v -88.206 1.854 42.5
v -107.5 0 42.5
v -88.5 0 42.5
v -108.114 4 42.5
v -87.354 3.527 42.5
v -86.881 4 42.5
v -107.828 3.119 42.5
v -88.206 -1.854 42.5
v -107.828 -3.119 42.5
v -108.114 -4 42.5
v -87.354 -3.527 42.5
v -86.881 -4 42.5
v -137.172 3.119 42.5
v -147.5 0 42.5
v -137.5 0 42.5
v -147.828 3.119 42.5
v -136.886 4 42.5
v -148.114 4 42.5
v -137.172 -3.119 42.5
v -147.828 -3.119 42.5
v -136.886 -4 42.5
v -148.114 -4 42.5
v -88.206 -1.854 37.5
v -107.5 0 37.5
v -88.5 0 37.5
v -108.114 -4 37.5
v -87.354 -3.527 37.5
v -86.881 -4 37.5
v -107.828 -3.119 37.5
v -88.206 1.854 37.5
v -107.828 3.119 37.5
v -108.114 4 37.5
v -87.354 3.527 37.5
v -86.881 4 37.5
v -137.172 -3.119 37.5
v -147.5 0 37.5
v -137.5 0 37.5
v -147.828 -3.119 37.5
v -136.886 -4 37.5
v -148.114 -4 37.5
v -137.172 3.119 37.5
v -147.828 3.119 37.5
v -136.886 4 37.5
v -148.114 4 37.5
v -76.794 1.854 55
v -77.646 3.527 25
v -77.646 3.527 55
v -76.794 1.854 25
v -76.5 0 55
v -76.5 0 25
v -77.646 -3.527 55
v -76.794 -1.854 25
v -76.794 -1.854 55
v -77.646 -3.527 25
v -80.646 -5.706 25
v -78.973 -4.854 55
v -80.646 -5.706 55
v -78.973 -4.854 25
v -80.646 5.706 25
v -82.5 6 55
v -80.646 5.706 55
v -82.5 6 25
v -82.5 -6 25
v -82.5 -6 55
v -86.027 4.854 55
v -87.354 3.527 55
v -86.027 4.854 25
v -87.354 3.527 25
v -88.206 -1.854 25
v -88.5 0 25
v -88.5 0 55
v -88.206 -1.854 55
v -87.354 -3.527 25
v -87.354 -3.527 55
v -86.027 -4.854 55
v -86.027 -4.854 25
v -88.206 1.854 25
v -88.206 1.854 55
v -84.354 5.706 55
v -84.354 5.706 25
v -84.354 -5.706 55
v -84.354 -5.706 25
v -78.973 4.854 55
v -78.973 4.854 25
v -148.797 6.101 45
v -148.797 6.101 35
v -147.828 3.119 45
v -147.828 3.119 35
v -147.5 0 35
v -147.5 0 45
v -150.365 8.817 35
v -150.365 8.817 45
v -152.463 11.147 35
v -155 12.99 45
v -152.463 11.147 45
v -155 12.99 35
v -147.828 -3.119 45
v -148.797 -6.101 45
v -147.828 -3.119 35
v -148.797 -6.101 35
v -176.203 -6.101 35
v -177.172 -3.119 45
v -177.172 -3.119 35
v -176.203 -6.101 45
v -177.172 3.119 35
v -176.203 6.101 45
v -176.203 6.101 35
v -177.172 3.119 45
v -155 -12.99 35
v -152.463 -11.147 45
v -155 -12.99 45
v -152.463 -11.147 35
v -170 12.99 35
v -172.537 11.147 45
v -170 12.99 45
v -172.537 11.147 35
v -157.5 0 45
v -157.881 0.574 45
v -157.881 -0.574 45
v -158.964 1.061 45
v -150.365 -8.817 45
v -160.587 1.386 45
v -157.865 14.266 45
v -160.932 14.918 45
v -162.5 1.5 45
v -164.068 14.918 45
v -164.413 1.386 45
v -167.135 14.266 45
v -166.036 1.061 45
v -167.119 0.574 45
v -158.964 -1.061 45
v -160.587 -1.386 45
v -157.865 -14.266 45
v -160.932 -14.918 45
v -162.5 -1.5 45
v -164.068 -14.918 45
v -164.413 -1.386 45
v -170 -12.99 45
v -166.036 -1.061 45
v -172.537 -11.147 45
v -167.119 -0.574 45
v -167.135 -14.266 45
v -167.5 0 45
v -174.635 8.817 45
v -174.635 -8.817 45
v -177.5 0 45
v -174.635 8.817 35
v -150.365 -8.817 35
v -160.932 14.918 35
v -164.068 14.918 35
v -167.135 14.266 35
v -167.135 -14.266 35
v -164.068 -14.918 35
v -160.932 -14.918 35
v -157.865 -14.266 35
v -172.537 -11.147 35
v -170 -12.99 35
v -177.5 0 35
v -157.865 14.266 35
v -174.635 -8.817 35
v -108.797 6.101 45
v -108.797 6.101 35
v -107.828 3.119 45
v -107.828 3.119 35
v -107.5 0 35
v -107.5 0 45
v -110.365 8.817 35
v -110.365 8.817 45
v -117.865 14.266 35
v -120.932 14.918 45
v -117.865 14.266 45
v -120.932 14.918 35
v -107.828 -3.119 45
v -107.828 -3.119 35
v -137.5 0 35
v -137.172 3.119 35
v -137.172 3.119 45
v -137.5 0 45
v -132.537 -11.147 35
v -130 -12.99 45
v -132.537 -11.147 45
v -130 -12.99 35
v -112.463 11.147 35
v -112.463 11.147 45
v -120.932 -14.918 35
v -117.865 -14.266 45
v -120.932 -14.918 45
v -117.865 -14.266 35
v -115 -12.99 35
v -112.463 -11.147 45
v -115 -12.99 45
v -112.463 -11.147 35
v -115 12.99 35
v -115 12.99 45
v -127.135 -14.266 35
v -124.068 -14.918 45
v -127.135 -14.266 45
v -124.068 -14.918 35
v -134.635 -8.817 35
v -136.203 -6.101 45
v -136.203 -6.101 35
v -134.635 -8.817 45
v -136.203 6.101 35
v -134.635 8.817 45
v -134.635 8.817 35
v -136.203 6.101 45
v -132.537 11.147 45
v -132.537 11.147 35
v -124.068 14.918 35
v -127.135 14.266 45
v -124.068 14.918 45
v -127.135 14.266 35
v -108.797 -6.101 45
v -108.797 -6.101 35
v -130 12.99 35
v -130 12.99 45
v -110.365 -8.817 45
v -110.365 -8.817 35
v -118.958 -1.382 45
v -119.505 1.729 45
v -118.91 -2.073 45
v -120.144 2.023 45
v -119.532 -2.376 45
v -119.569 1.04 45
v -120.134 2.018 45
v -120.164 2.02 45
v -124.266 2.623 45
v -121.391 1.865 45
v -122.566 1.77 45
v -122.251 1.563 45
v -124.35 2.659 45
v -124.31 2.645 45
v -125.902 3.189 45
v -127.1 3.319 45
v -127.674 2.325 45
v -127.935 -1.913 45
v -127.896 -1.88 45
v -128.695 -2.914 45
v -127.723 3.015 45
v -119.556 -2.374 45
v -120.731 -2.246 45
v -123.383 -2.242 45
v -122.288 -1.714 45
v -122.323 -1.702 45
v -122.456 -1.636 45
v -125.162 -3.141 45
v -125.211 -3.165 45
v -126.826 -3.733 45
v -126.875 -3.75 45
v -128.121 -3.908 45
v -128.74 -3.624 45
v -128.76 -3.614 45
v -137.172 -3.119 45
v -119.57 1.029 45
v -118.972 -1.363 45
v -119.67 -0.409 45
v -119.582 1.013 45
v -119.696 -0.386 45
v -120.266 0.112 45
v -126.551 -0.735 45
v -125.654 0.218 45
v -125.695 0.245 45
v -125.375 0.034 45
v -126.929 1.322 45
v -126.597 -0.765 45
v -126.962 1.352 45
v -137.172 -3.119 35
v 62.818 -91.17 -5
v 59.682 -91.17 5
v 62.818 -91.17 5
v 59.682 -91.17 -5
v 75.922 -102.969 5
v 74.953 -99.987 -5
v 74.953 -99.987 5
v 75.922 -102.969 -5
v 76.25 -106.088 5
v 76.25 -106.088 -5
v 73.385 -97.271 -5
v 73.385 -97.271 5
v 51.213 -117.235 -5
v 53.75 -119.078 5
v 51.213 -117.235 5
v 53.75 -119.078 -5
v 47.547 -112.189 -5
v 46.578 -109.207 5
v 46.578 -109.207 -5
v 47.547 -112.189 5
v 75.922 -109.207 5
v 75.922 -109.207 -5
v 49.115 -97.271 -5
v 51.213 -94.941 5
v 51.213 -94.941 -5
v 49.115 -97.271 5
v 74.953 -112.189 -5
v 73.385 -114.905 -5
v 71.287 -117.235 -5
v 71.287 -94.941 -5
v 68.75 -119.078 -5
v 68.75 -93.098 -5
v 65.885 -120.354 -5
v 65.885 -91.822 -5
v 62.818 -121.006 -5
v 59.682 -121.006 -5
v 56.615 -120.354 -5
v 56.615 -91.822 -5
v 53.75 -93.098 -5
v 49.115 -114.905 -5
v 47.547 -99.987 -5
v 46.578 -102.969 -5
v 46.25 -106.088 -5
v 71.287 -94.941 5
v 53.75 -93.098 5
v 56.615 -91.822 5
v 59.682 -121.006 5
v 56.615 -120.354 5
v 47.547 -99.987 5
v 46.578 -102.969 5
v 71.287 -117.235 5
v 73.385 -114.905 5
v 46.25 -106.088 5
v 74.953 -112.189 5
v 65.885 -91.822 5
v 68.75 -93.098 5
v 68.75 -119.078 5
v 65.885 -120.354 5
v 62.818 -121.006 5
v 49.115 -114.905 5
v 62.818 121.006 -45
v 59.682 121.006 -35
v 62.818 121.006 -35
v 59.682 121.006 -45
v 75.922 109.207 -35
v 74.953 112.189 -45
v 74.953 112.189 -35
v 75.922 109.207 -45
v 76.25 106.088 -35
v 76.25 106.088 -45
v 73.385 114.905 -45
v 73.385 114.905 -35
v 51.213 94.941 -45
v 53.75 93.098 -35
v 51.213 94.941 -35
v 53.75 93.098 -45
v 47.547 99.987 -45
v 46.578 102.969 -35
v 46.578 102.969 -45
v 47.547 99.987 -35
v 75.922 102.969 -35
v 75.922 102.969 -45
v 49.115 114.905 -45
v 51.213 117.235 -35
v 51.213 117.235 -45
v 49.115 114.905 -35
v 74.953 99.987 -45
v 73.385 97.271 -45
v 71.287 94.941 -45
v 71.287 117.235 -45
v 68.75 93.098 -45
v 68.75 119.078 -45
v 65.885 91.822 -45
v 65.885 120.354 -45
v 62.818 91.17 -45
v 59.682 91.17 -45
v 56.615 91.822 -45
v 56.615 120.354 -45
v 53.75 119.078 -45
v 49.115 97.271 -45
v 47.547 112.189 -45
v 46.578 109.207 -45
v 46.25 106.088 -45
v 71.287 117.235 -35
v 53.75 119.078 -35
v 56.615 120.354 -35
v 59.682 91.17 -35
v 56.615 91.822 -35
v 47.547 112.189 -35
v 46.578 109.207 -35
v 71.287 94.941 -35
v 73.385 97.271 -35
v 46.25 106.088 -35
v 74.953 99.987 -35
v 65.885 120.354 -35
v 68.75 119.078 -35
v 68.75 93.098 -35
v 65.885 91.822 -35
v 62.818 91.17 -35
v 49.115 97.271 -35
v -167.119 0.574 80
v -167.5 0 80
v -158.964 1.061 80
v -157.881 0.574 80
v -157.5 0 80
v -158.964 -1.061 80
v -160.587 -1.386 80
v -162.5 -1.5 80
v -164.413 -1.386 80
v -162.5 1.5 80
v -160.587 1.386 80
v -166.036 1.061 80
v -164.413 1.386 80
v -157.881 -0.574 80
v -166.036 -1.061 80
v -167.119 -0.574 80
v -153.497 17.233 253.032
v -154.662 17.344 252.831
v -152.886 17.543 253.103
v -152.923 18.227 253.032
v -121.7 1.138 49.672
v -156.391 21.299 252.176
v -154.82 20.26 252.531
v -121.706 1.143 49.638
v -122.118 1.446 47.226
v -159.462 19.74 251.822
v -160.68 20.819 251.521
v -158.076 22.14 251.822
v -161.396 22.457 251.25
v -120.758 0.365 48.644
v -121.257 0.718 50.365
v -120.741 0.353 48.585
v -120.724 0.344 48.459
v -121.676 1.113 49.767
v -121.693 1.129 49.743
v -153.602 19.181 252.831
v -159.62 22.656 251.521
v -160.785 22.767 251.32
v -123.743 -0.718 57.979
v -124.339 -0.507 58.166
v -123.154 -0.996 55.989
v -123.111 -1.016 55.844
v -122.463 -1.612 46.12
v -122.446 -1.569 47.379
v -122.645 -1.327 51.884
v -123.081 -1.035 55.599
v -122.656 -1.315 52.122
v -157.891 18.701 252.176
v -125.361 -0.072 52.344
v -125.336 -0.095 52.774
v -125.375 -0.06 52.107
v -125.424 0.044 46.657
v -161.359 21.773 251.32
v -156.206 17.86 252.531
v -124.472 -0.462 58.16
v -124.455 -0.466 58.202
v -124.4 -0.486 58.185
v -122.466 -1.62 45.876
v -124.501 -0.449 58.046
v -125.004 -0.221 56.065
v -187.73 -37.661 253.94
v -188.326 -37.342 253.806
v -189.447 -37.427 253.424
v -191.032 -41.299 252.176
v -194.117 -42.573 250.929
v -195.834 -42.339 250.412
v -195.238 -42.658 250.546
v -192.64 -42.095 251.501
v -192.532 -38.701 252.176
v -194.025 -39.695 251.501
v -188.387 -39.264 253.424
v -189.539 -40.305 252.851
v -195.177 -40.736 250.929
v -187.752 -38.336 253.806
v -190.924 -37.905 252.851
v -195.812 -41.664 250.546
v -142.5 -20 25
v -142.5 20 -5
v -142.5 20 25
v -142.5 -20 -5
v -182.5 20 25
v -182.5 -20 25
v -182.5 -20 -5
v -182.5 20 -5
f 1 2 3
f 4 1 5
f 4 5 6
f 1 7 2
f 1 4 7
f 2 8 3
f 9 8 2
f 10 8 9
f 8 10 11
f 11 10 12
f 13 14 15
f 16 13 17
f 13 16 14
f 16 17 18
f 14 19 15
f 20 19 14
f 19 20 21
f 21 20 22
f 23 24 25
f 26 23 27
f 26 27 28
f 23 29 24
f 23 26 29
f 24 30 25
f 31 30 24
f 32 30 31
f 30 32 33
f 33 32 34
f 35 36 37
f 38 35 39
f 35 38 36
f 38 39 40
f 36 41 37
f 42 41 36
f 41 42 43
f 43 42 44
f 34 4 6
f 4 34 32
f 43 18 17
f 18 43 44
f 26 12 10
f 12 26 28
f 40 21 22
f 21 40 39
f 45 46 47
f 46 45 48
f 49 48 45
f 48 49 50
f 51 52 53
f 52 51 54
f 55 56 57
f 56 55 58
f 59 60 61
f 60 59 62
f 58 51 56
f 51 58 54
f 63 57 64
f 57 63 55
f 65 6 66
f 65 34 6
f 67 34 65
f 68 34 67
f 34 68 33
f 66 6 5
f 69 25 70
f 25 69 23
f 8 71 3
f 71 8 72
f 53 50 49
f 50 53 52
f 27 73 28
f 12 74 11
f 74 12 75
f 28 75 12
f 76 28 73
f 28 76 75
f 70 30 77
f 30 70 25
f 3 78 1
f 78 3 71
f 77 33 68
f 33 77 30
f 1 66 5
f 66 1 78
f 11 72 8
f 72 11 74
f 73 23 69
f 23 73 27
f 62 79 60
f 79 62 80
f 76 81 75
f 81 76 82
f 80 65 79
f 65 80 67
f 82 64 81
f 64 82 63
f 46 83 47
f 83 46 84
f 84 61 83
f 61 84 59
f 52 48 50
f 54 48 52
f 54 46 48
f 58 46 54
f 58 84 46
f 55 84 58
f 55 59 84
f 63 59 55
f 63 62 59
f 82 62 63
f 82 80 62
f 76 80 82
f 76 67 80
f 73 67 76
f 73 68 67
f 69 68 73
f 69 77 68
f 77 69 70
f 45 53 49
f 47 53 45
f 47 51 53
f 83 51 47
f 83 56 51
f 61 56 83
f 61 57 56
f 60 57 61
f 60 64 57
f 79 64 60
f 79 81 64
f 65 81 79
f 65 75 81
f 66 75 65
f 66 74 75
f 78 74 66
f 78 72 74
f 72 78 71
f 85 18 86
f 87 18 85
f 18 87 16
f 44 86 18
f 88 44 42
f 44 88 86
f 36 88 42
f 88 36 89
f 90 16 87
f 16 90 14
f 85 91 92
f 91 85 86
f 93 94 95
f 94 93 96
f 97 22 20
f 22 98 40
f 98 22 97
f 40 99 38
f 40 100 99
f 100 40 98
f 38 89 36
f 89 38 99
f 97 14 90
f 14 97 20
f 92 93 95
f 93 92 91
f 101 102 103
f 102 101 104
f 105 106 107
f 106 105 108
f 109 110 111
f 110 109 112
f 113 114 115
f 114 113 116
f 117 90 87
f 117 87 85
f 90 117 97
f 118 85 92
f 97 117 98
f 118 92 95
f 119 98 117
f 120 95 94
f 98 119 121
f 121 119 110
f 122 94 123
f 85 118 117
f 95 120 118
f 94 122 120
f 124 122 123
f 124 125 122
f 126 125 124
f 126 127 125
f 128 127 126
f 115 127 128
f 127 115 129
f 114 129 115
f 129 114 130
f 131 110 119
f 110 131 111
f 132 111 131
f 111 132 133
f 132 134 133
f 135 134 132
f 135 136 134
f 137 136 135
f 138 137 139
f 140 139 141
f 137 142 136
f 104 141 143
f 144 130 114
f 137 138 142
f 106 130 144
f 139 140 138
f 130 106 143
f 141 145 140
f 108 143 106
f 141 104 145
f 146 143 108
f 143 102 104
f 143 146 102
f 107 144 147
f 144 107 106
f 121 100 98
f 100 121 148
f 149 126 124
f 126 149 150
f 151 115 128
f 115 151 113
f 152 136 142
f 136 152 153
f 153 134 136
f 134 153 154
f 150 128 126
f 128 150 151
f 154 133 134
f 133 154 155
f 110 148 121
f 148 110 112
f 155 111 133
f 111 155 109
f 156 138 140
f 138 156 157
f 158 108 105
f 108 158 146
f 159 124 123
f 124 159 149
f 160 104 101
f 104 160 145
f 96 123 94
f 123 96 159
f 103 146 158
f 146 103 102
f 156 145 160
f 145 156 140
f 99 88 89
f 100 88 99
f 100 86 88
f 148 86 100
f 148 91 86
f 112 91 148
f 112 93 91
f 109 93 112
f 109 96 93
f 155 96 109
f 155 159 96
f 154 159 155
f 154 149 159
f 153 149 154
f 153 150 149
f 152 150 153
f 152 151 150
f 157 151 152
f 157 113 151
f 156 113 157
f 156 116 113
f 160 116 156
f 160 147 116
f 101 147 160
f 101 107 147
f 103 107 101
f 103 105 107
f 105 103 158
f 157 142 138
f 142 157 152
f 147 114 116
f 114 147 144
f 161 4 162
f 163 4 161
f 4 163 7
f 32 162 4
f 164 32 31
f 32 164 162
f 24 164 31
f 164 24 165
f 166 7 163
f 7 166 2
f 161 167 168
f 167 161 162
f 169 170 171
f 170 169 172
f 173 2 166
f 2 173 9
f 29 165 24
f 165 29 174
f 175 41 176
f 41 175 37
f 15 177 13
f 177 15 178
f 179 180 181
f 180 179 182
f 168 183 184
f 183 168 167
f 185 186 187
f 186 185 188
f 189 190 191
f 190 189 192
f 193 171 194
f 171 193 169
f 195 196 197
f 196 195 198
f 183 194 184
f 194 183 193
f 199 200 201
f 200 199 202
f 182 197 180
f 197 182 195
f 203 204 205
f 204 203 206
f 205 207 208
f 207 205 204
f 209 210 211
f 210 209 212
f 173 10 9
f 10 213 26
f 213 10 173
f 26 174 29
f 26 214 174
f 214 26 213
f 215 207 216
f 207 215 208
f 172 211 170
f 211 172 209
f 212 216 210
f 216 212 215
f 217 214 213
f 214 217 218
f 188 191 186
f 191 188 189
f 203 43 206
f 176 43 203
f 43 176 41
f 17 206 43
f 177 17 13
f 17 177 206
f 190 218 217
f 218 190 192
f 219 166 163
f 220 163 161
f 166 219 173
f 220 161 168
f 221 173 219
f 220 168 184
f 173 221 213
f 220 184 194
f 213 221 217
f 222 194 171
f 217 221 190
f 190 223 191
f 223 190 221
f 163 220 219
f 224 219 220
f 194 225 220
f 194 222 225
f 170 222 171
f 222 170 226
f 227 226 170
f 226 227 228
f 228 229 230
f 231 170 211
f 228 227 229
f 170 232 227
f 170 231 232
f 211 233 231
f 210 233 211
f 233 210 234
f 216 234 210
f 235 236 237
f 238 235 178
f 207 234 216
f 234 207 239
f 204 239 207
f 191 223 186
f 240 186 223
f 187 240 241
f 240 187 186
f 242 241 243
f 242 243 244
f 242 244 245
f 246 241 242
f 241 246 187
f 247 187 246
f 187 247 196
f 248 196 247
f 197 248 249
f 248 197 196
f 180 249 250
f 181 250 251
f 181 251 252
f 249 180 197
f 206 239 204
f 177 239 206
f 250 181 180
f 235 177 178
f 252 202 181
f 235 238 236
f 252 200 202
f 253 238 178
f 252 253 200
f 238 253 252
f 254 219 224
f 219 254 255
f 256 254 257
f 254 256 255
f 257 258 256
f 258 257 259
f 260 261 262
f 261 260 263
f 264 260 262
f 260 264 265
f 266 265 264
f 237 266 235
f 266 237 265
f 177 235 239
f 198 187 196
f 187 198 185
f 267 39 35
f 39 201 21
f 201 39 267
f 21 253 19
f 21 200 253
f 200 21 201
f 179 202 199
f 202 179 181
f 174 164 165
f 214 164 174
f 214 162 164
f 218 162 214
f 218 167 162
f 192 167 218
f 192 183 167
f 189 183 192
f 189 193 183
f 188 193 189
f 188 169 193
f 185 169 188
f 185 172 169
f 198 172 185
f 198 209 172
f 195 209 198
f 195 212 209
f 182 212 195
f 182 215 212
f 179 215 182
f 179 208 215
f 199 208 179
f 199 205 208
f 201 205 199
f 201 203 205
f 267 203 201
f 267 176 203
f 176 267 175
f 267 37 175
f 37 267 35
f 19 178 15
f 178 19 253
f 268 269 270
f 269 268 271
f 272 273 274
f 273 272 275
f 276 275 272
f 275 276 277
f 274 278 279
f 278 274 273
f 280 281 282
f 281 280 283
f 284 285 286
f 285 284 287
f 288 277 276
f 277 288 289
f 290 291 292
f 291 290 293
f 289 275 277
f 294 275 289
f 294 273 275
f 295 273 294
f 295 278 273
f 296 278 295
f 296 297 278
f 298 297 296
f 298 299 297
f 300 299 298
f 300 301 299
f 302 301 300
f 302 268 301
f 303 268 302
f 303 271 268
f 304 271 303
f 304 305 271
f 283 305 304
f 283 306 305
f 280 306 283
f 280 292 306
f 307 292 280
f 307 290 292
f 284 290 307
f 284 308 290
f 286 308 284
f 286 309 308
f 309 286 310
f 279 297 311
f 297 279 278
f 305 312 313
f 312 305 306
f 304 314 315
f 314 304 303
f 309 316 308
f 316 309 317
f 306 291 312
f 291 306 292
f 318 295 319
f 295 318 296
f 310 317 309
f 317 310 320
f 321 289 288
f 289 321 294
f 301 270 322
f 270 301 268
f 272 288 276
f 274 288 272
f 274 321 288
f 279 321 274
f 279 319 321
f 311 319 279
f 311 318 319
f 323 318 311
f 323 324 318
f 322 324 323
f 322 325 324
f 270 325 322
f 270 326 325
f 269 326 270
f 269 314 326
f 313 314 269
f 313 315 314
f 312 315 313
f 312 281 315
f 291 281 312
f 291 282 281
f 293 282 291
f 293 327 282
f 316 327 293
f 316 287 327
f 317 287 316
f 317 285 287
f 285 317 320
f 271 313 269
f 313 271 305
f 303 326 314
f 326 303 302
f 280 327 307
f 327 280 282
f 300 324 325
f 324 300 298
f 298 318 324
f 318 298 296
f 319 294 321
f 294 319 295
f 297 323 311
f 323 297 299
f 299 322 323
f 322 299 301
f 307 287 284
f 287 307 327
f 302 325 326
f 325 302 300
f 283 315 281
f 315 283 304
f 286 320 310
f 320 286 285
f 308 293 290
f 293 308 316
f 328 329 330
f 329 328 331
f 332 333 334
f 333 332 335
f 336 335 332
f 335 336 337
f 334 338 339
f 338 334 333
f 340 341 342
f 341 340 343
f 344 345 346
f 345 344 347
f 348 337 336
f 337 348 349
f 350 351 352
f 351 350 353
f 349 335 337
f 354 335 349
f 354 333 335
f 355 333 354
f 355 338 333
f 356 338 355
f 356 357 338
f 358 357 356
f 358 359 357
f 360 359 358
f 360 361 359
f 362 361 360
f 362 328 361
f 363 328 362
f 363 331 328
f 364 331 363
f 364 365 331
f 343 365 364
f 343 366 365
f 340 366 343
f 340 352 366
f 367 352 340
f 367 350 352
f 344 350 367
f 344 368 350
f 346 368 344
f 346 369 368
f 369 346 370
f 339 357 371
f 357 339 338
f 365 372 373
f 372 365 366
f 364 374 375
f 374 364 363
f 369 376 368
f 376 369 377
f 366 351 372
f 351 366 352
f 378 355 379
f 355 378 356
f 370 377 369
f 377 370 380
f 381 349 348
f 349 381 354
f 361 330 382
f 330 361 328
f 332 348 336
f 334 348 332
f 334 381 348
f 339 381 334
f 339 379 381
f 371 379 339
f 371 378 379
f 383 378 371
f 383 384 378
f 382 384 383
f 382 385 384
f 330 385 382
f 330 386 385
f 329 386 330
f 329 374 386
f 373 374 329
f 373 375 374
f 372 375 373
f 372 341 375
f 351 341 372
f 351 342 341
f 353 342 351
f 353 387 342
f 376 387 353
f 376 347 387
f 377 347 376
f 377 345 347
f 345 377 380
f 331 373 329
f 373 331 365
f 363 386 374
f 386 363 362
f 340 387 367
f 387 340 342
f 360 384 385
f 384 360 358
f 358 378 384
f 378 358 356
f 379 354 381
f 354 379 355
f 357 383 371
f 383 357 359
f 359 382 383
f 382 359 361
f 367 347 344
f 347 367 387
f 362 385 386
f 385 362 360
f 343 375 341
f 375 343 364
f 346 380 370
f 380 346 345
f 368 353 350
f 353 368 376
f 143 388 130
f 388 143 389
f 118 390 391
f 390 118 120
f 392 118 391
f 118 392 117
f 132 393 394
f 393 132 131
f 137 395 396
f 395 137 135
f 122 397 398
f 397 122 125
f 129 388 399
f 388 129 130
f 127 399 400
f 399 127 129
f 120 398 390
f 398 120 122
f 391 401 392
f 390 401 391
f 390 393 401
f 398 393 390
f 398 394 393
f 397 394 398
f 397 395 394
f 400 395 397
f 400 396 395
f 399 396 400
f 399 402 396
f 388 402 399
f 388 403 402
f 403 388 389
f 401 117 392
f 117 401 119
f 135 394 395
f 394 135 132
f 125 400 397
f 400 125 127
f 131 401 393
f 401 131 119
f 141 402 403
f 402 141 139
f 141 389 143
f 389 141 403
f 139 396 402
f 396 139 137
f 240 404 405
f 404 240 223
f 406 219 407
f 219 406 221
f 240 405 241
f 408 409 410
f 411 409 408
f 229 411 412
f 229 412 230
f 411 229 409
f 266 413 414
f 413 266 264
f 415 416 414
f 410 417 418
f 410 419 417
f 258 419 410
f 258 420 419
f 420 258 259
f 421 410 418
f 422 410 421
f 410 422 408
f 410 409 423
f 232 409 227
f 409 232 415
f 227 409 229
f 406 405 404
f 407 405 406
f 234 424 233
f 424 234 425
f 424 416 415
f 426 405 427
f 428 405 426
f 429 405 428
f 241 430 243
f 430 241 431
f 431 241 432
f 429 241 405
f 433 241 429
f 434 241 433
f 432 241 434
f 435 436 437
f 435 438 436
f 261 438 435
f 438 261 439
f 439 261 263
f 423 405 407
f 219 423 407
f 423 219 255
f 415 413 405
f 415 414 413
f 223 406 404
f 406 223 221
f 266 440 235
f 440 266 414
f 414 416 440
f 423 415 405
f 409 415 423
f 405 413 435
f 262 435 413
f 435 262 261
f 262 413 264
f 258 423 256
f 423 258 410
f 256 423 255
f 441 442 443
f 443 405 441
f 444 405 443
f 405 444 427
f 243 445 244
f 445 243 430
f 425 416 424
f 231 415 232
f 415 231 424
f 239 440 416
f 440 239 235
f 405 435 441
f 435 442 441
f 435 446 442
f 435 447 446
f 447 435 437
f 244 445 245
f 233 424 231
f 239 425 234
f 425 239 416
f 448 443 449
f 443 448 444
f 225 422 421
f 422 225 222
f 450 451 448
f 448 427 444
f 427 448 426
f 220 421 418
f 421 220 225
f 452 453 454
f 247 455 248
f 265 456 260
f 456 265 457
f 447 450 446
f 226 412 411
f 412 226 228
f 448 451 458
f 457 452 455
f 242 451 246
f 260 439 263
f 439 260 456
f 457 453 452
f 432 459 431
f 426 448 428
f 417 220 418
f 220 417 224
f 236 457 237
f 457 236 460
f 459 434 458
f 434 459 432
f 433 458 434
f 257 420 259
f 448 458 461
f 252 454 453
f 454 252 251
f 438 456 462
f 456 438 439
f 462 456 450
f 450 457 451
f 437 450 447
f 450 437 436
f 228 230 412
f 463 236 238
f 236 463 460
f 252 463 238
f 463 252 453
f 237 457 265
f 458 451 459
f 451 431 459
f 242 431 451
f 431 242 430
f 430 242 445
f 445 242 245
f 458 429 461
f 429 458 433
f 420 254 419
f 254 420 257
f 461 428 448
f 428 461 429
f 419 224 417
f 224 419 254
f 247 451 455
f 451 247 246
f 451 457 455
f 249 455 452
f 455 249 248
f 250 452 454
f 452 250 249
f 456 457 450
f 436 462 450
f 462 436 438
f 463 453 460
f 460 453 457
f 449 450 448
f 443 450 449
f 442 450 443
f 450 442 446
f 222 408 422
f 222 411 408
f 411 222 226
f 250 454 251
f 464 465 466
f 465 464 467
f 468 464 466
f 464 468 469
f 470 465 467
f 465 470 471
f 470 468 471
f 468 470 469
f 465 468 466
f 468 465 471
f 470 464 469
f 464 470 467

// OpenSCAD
// =========================================================
// DRIVE SYSTEM — Single Motor + Belt/Chain to 3 Helices
// =========================================================
// One motor (or hand crank) drives one helix shaft.
// Two belts distribute rotation to the other two helices.
// All 3 helices rotate at same speed (1:1 pulleys).
//
// Belt routing:
//   Motor → Helix 1 shaft end (direct coupling or short belt)
//   Helix 1 other end → Belt → Helix 2 shaft end
//   Helix 1 other end → Belt → Helix 3 shaft end
//   (or: Motor → central, then 3 belts out to each helix)
//
// Motor placement: configurable angle on frame.
// =========================================================

include <config.scad>

/* [Visibility] */
SHOW_MOTOR      = true;
SHOW_CRANK      = true;
SHOW_BELTS      = true;
SHOW_PULLEYS    = true;

// =========================================================
// STANDALONE RENDER
// =========================================================
drive_system_assembly(anim_t());


// =========================================================
// DRIVE SYSTEM ASSEMBLY
// =========================================================

module drive_system_assembly(t = 0) {
    crank_angle = t * 360;

    // Helix shaft endpoint positions (for belt routing)
    // Each helix shaft center is at a hex vertex.
    // The shaft runs perpendicular to slider direction.
    // Belt pulleys are at the shaft ENDS (above and below the cam stack).
    helix_positions = [for (tier_idx = [0 : 2])
        let(
            vertex_angle = HELIX_VERTEX_ANGLES[tier_idx],
            helix_r = FRAME_HEX_R + HELIX_DISTANCE,
            hx = helix_r * cos(vertex_angle),
            hy = helix_r * sin(vertex_angle),
            tier_z = (1 - tier_idx) * TIER_PITCH
        )
        [hx, hy, tier_z]
    ];

    // Motor/crank position — on the frame near Helix 1
    motor_r = FRAME_HEX_R + HELIX_DISTANCE + 40;
    motor_angle = MOTOR_POSITION_ANGLE;
    motor_x = motor_r * cos(motor_angle);
    motor_y = motor_r * sin(motor_angle);
    motor_z = helix_positions[0][2];  // same Z as Helix 1

    // Hand crank
    if (SHOW_CRANK) {
        translate([motor_x, motor_y, motor_z]) {
            // Crank shaft
            color(C_STEEL)
            rotate([0, 0, motor_angle + 90])
                rotate([0, 90, 0])
                    cylinder(d = 8, h = 20, center = true, $fn = 20);

            // Crank arm (rotates with animation)
            color([0.6, 0.3, 0.3])
            rotate([0, 0, crank_angle]) {
                translate([CRANK_ARM/2, 0, 0])
                    cube([CRANK_ARM, 8, 5], center = true);

                // Handle
                translate([CRANK_ARM, 0, 0])
                    color([0.2, 0.2, 0.2])
                    cylinder(d = CRANK_HANDLE_DIA, h = CRANK_HANDLE_LEN,
                             center = true, $fn = 20);
            }

            // Drive pulley at motor
            if (SHOW_PULLEYS)
                color(C_STEEL)
                cylinder(d = DRIVE_PULLEY_DIA, h = BELT_WIDTH, center = true, $fn = 30);
        }
    }

    // Motor (simplified box representation)
    if (SHOW_MOTOR) {
        translate([motor_x, motor_y, motor_z])
            color([0.3, 0.3, 0.4])
            translate([0, 0, -30])
                cube([40, 40, 30], center = true);
    }

    // Belt pulleys on each helix shaft end
    if (SHOW_PULLEYS) {
        for (tier_idx = [0 : 2]) {
            hp = helix_positions[tier_idx];
            color(C_STEEL)
            translate([hp[0], hp[1], hp[2]])
                cylinder(d = DRIVE_PULLEY_DIA, h = BELT_WIDTH, center = true, $fn = 30);
        }
    }

    // Belts (simplified as lines/tubes between pulleys)
    if (SHOW_BELTS) {
        // Belt: Motor → Helix 1
        belt_segment([motor_x, motor_y, motor_z], helix_positions[0]);

        // Belt: Helix 1 → Helix 2
        belt_segment(helix_positions[0], helix_positions[1]);

        // Belt: Helix 1 → Helix 3
        belt_segment(helix_positions[0], helix_positions[2]);
    }

    echo(str("=== DRIVE SYSTEM ==="));
    echo(str("Motor position: angle=", motor_angle, "° r=", motor_r, "mm"));
    echo(str("Belt 1→2 length: ",
        sqrt(pow(helix_positions[0][0]-helix_positions[1][0], 2) +
             pow(helix_positions[0][1]-helix_positions[1][1], 2) +
             pow(helix_positions[0][2]-helix_positions[1][2], 2)), "mm"));
    echo(str("Belt 1→3 length: ",
        sqrt(pow(helix_positions[0][0]-helix_positions[2][0], 2) +
             pow(helix_positions[0][1]-helix_positions[2][1], 2) +
             pow(helix_positions[0][2]-helix_positions[2][2], 2)), "mm"));
}


// =========================================================
// BELT SEGMENT (tube between two points)
// =========================================================

module belt_segment(p1, p2) {
    dx = p2[0] - p1[0];
    dy = p2[1] - p1[1];
    dz = p2[2] - p1[2];
    length = sqrt(dx*dx + dy*dy + dz*dz);

    // Direction angles
    az = atan2(dy, dx);
    ay = -atan2(dz, sqrt(dx*dx + dy*dy));

    color(C_BELT)
    translate([p1[0], p1[1], p1[2]])
        rotate([0, 0, az])
            rotate([0, -ay, 0])
                // Belt as a flattened cylinder
                scale([1, 0.3, 1])
                    cylinder(d = BELT_WIDTH, h = length, $fn = 16);
}
